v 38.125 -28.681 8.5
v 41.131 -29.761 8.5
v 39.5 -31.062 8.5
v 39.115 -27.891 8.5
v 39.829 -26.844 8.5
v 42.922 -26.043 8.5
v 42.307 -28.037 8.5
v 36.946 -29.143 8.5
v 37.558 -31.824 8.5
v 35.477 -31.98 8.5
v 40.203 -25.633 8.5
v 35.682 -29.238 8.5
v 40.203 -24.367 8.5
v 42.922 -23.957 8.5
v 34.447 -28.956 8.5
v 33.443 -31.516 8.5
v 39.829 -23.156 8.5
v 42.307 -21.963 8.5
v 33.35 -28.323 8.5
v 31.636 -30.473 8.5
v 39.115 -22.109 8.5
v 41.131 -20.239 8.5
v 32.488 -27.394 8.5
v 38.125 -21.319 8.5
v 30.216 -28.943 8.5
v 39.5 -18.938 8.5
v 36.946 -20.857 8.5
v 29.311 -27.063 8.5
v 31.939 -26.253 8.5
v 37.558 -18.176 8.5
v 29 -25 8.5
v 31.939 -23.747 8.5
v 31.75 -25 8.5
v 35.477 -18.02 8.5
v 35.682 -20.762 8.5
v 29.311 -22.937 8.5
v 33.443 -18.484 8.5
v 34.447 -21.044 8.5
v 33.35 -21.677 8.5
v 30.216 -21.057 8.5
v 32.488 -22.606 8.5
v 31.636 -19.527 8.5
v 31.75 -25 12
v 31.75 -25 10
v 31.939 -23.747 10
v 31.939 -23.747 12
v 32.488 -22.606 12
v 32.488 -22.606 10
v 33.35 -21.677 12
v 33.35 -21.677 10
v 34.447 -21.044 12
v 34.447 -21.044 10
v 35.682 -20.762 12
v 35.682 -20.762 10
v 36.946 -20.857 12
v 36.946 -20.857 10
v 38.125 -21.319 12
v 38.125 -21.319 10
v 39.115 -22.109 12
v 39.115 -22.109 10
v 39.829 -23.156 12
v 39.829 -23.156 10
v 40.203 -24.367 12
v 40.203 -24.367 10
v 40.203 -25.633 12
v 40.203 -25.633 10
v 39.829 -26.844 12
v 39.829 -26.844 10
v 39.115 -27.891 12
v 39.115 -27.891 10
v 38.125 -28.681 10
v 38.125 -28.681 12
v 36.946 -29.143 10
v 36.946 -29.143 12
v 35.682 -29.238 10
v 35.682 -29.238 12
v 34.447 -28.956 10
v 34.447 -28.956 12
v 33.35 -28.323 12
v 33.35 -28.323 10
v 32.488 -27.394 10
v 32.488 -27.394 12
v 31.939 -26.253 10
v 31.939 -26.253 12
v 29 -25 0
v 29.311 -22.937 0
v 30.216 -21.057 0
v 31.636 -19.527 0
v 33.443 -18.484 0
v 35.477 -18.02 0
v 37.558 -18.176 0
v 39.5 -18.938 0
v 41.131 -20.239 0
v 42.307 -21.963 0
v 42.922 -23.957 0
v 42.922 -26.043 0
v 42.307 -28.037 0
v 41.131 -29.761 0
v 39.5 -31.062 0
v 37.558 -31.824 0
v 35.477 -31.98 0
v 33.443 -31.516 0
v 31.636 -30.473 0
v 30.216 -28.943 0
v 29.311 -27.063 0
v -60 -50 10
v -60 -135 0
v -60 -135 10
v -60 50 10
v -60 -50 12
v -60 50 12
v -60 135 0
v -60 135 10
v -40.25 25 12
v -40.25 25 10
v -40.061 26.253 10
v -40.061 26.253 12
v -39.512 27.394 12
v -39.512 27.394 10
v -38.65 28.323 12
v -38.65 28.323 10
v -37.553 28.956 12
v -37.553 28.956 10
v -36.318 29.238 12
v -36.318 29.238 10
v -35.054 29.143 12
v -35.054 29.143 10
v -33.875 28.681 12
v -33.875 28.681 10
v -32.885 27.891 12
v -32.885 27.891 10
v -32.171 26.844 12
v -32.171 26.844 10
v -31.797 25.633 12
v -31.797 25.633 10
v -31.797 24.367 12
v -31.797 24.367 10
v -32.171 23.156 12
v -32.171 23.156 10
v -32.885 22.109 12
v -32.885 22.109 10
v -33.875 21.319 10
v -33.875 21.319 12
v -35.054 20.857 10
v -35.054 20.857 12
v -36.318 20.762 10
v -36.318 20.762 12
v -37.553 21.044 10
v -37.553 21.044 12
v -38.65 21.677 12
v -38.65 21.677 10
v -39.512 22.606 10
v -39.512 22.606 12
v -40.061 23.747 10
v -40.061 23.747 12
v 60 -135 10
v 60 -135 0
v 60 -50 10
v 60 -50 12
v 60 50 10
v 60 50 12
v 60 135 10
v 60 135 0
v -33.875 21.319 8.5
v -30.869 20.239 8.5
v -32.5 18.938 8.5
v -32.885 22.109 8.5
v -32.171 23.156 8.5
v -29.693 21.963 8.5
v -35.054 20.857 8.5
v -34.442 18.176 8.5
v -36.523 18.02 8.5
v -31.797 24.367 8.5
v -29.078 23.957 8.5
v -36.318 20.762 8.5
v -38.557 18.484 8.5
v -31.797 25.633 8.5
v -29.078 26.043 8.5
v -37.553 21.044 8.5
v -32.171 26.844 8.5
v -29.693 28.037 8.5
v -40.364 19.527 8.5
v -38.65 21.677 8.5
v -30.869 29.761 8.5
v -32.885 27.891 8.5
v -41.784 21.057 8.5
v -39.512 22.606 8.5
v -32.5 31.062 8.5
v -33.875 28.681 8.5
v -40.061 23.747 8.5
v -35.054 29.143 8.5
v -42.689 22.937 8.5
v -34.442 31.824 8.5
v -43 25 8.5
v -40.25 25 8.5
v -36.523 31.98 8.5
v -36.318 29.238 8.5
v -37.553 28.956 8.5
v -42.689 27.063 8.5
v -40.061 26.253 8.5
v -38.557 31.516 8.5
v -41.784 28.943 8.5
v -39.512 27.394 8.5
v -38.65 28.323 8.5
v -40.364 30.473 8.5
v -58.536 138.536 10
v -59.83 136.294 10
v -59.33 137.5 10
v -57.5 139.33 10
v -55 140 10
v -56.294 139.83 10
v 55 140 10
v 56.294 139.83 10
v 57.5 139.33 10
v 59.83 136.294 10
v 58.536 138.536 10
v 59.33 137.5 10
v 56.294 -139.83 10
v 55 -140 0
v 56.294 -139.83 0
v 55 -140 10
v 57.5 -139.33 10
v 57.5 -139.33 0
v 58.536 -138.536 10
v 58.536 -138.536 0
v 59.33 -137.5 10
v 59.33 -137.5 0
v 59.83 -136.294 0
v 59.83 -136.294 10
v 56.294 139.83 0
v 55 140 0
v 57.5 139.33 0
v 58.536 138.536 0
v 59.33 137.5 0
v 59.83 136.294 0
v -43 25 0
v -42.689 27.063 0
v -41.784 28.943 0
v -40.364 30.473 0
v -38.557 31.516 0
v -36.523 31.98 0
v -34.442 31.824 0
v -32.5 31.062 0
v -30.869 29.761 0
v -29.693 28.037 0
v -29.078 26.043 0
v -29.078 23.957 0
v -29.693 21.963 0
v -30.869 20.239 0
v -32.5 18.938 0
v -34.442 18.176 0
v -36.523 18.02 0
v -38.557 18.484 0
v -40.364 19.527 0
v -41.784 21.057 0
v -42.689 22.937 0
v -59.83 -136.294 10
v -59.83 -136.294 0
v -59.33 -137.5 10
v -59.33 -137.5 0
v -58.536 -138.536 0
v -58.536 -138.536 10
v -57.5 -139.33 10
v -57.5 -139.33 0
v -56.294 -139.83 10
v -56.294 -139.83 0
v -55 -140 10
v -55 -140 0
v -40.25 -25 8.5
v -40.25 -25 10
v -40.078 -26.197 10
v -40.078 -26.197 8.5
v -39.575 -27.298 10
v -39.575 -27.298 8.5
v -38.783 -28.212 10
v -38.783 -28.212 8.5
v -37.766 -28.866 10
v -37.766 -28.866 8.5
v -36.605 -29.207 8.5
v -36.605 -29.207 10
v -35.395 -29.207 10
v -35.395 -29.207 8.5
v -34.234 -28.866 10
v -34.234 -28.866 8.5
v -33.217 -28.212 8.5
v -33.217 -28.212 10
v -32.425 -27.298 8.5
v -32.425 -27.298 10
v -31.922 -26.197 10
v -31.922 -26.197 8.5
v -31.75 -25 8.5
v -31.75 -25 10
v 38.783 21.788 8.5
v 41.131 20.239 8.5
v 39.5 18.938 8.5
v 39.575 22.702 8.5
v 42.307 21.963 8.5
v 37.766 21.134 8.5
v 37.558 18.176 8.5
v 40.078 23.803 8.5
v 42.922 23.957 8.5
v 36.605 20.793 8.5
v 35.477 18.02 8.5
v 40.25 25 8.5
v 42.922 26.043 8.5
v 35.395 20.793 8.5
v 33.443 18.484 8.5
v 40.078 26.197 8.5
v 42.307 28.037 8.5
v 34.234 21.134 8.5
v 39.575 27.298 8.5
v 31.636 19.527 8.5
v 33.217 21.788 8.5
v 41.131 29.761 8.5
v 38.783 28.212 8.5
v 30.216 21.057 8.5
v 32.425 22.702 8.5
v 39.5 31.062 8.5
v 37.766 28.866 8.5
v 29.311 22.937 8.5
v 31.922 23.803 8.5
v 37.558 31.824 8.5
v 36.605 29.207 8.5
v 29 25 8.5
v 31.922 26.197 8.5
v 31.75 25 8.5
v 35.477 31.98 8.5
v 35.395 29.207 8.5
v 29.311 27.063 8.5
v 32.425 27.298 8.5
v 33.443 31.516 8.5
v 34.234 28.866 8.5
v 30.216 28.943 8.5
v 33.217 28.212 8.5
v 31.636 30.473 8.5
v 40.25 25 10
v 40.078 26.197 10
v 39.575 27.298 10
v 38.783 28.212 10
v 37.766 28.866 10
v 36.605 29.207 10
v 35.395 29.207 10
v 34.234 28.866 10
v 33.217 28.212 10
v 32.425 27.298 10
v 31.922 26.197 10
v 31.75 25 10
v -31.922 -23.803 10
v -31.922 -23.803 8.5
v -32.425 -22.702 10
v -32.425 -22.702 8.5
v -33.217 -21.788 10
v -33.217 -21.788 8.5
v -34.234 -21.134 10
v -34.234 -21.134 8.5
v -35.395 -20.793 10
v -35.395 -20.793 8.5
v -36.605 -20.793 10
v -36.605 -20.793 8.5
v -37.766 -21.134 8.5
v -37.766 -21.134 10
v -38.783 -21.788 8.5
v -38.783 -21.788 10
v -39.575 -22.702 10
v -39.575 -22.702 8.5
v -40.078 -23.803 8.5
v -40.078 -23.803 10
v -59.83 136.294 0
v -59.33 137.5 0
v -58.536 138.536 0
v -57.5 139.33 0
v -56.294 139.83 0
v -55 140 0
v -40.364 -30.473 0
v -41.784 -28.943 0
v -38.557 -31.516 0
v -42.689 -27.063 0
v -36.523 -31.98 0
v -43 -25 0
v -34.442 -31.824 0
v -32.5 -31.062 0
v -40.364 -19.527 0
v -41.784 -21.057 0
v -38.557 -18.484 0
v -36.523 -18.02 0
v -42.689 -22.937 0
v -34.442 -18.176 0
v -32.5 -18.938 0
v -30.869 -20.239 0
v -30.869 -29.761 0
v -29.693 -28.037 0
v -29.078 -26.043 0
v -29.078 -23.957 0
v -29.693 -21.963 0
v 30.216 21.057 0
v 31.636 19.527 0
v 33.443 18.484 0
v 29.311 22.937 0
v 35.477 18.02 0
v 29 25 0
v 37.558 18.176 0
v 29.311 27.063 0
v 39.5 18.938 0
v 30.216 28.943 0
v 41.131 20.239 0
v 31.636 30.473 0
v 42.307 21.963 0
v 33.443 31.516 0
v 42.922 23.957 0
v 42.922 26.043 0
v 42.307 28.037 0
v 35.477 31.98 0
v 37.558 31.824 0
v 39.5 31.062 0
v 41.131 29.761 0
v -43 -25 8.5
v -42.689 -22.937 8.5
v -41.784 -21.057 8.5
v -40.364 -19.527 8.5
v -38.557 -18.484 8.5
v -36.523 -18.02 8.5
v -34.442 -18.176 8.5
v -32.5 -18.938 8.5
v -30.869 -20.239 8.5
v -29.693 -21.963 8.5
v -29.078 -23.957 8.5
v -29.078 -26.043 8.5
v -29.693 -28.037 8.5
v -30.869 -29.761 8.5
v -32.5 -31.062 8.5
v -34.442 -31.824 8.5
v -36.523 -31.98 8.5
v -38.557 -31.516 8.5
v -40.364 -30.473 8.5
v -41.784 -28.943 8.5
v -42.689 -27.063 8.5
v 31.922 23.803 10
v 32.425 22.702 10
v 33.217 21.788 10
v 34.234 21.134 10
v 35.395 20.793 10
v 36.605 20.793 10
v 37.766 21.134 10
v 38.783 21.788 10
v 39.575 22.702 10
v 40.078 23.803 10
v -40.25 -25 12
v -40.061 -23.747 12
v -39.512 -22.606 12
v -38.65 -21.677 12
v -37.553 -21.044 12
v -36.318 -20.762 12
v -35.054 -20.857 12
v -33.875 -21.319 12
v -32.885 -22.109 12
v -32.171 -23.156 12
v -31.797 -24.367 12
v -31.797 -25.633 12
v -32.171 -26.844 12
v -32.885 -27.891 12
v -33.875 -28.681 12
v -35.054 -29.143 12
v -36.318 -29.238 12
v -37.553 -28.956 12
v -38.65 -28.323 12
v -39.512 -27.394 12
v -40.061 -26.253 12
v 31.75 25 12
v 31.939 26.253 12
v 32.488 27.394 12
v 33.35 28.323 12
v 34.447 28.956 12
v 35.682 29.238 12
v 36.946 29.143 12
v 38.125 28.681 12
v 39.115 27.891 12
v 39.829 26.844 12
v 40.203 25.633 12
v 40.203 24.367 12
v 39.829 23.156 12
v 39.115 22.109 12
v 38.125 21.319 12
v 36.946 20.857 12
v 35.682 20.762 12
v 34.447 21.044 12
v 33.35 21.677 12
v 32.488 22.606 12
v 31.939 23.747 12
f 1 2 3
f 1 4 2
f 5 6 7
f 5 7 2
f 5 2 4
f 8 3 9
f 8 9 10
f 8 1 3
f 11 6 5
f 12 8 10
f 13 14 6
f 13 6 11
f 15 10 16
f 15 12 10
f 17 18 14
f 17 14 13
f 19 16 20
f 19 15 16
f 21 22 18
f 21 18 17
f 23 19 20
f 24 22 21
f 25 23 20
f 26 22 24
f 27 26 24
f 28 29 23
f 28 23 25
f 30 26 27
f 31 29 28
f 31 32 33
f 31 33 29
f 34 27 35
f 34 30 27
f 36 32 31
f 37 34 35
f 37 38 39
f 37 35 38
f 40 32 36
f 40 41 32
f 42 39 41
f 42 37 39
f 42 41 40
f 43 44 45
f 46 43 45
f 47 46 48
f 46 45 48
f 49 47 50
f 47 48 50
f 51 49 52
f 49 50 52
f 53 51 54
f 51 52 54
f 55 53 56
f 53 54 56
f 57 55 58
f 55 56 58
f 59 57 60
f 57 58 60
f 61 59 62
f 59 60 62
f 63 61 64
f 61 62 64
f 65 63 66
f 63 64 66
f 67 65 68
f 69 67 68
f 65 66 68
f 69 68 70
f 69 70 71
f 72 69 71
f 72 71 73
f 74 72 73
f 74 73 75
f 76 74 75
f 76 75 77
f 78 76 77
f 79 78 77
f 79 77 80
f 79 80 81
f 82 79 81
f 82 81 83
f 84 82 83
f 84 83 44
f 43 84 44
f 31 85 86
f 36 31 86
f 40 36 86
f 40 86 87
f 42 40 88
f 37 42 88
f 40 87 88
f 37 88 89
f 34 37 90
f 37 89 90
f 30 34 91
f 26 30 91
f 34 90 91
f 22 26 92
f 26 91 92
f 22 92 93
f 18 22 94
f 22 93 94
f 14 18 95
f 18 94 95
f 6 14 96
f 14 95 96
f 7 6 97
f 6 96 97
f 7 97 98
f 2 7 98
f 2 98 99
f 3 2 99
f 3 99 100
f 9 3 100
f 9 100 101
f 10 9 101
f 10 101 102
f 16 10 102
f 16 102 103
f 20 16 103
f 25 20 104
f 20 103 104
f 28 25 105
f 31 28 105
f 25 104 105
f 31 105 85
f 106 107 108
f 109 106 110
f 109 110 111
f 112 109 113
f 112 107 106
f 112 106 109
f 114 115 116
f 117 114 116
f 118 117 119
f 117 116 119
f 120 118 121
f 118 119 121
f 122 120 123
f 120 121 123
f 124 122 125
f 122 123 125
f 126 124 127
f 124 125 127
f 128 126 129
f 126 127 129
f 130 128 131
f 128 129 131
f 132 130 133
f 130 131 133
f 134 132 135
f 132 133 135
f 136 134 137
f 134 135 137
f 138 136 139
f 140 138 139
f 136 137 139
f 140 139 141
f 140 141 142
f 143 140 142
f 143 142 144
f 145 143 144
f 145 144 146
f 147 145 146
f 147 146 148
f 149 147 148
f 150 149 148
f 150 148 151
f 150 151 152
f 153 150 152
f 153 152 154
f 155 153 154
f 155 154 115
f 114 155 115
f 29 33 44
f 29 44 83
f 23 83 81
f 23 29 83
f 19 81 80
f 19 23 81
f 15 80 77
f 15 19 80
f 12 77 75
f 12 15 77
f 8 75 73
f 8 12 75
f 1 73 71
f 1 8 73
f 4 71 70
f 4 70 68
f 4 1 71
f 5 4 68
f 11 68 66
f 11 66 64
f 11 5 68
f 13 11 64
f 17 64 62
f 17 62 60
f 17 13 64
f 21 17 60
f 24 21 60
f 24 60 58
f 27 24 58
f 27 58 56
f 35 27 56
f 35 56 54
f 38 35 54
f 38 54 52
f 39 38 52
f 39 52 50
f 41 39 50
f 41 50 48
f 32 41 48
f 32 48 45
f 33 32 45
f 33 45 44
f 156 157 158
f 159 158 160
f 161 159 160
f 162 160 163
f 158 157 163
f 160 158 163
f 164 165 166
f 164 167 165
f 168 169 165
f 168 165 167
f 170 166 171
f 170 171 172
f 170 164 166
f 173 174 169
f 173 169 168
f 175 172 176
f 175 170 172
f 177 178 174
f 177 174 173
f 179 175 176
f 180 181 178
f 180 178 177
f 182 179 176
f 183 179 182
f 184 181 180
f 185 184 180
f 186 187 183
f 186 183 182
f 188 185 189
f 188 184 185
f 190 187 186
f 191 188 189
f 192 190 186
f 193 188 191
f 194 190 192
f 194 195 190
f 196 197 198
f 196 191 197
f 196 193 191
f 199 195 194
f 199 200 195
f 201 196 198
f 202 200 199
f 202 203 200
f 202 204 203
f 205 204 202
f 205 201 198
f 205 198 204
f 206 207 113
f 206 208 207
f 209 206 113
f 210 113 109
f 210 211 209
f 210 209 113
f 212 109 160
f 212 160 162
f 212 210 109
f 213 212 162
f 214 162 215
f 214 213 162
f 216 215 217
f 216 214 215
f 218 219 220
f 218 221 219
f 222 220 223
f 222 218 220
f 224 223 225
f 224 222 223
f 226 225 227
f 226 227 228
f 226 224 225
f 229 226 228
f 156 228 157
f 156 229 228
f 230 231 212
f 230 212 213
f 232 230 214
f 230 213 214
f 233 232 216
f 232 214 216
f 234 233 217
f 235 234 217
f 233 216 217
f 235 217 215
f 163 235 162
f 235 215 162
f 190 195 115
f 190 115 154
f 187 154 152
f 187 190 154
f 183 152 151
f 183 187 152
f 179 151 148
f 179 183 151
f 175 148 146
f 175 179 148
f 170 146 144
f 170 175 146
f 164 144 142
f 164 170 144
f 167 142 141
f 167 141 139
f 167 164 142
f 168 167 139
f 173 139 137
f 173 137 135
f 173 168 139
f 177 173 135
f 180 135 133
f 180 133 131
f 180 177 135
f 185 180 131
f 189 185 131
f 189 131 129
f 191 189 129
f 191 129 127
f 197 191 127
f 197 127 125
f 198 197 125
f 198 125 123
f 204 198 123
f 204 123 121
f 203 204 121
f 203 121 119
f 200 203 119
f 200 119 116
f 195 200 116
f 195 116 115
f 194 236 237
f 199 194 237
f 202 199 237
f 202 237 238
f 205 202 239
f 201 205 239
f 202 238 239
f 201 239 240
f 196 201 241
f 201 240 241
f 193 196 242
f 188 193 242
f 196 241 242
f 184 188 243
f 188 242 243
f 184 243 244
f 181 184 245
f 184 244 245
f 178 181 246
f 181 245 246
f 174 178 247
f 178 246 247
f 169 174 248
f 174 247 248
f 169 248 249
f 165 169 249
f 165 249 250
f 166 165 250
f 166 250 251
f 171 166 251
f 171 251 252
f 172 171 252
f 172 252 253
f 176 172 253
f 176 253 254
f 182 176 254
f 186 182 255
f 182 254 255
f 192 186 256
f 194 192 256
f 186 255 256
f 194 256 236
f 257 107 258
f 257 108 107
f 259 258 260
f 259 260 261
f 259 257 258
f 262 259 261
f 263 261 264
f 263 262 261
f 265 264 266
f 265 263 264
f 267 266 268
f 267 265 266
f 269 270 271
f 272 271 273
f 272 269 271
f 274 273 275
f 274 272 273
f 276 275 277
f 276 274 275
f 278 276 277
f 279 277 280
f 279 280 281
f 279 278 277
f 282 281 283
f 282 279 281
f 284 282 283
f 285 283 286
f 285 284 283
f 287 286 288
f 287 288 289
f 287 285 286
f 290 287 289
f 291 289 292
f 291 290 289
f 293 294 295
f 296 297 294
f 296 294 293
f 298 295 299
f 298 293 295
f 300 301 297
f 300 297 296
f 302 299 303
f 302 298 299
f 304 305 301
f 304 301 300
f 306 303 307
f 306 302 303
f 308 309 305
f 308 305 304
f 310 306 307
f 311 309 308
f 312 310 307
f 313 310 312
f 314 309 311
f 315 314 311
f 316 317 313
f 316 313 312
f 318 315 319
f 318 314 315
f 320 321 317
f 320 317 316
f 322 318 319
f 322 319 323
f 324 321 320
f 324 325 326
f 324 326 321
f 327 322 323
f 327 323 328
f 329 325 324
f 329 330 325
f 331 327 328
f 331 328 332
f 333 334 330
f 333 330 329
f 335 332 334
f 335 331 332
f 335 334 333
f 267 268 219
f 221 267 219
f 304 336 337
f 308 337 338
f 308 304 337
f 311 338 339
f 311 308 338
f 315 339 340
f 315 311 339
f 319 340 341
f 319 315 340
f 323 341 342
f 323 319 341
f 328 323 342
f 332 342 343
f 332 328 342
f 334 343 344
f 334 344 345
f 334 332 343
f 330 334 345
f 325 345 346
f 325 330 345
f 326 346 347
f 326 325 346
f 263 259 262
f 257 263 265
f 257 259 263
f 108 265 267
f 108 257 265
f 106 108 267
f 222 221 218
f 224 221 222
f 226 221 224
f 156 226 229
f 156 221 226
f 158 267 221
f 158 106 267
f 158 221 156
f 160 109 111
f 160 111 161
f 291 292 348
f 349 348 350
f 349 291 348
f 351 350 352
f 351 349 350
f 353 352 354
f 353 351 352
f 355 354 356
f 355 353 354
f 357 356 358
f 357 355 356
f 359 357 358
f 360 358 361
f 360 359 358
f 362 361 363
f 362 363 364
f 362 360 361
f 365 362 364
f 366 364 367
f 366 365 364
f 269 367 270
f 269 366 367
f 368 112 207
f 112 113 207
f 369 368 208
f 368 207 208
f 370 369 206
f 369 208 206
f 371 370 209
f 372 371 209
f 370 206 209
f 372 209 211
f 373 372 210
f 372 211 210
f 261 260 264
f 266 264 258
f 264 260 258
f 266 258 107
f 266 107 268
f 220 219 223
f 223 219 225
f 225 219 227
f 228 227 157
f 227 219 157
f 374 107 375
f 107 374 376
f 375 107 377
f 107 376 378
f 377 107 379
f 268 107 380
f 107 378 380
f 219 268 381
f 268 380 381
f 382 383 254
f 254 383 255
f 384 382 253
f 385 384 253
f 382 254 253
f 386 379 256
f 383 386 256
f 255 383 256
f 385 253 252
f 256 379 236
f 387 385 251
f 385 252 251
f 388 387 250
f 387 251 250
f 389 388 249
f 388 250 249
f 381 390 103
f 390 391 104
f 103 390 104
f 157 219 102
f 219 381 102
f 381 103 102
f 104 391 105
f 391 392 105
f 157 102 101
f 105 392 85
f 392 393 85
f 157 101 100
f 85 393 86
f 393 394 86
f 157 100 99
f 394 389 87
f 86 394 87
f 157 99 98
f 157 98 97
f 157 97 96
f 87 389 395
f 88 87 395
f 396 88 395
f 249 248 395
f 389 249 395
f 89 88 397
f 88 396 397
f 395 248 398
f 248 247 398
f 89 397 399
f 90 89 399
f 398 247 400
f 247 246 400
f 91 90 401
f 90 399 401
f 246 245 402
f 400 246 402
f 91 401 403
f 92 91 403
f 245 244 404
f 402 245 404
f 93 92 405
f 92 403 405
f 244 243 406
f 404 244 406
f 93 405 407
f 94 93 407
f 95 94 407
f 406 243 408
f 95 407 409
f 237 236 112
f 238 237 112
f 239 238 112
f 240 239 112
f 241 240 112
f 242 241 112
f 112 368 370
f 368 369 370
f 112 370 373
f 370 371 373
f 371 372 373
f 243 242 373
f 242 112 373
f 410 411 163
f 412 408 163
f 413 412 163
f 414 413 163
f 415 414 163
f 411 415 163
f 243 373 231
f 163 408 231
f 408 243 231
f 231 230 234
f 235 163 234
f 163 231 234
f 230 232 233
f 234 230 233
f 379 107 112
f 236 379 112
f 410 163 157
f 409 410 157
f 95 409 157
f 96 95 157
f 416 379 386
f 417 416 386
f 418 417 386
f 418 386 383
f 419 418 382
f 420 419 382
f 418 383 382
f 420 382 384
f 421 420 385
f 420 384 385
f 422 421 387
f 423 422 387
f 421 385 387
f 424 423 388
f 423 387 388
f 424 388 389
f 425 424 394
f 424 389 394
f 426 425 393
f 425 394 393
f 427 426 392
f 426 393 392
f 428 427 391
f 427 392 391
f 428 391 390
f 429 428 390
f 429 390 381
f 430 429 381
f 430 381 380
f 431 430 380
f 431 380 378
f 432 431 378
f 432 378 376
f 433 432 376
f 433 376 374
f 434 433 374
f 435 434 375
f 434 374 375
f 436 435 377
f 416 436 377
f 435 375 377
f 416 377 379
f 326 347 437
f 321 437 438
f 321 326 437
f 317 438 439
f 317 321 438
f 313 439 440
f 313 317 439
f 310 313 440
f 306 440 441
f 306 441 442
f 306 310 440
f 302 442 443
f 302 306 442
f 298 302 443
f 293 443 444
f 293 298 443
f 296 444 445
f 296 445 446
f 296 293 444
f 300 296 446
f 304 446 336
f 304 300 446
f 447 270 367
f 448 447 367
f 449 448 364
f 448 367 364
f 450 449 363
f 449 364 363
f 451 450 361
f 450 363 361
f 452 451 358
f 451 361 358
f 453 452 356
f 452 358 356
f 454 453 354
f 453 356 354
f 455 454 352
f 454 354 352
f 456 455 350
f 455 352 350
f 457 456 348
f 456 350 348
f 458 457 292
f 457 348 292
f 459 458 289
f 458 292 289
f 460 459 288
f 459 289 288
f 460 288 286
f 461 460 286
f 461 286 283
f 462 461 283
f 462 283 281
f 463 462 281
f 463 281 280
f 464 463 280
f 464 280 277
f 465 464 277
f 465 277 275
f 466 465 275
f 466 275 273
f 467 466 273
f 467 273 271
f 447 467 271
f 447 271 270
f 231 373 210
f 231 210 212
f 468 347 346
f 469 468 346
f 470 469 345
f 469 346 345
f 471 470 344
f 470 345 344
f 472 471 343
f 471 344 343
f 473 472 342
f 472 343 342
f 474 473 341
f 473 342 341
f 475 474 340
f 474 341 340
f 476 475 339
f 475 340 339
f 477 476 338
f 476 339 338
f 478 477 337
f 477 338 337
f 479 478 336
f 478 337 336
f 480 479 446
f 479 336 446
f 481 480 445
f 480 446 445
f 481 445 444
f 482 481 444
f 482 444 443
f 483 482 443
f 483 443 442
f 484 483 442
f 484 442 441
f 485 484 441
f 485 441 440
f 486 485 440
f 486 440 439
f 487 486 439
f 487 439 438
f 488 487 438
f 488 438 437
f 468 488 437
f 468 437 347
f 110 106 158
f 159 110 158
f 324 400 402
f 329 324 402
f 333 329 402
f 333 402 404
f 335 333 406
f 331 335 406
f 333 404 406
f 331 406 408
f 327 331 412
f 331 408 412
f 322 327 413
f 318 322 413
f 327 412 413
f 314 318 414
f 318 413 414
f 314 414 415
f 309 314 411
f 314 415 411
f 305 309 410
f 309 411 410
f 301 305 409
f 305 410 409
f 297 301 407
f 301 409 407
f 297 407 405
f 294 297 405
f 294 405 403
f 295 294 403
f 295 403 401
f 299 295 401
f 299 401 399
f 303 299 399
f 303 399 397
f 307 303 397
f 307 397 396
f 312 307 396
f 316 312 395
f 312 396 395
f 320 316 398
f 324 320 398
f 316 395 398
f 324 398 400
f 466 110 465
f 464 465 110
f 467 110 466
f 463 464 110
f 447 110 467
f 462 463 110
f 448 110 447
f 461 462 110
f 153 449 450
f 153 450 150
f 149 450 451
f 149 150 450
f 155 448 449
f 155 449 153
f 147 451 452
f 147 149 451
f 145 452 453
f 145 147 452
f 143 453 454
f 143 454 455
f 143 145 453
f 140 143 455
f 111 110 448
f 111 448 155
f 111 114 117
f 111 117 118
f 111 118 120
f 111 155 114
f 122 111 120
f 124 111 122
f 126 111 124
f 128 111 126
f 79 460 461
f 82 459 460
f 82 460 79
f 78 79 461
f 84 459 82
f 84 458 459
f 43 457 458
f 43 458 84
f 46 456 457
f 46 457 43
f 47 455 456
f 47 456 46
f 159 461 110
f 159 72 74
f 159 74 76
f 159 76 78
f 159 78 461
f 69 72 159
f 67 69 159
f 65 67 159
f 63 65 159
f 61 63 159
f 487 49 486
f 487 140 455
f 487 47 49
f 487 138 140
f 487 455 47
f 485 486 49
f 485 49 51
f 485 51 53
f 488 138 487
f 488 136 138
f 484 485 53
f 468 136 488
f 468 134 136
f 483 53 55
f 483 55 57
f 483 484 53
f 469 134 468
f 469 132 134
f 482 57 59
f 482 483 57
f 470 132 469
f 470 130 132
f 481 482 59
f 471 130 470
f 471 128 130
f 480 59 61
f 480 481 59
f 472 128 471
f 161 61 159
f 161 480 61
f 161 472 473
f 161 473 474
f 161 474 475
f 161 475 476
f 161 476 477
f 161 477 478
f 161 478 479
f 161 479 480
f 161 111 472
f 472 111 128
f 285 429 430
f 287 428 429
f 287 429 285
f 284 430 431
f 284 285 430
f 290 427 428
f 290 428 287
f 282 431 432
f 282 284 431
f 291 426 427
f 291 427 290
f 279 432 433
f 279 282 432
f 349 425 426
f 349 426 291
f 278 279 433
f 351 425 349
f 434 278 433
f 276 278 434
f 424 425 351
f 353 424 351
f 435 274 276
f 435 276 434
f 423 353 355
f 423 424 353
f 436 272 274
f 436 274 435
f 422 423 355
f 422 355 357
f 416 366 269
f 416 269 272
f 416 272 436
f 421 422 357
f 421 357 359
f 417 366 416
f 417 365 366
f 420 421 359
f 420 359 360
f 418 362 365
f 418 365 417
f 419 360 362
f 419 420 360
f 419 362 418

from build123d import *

# Parameters (mm, degrees)
SKETCH_1_W          = 120
SKETCH_1_H          = 280
SKETCH_1_R          = 4.25
EXTRUDE_1_DEPTH     = 10
FILLET_1_R          = 5
SKETCH_2_W          = 120
SKETCH_2_H          = 100
EXTRUDE_2_DEPTH     = 2
SKETCH_3_R          = 4.25
CUT_EXTRUDE_1_DEPTH = 35
SKETCH_5_R          = 7
CUT_EXTRUDE_3_DEPTH = 8.5


with BuildPart() as part:
    # 草图1 → 凸台-拉伸1 (new body)
    with BuildSketch(Plane.XY):
        Rectangle(SKETCH_1_W, SKETCH_1_H)
        with Locations((36, 25)):
            Circle(SKETCH_1_R, mode=Mode.SUBTRACT)
        with Locations(Location((36, -25, 0), (0, 0, 180))):
            Circle(SKETCH_1_R, mode=Mode.SUBTRACT)
        with Locations((-36, -25)):
            Circle(SKETCH_1_R, mode=Mode.SUBTRACT)
        with Locations(Location((-36, 25, 0), (0, 0, 180))):
            Circle(SKETCH_1_R, mode=Mode.SUBTRACT)
    extrude(amount=EXTRUDE_1_DEPTH)

    # 圆角1
    fillet_1_edges = [part.edges().sort_by_distance(p)[0] for p in [
        (-60, 140, 5),
        (60, 140, 5),
        (60, -140, 5),
        (-60, -140, 5),
    ]]
    fillet(fillet_1_edges, radius=FILLET_1_R)

    # 草图2 → 凸台-拉伸2 (add)
    with BuildSketch(Plane.XY.offset(10)):
        Rectangle(SKETCH_2_W, SKETCH_2_H)
    extrude(amount=EXTRUDE_2_DEPTH)

    # 草图3 → 切除-拉伸1 (cut)
    with BuildSketch(Plane(origin=(0, 0, 0), x_dir=(-1, 0, 0), z_dir=(0, 0, -1))):
        with Locations((-36, -25)):
            Circle(SKETCH_3_R)
        with Locations((-36, 25)):
            Circle(SKETCH_3_R)
        with Locations((36, 25)):
            Circle(SKETCH_3_R)
        with Locations((36, -25)):
            Circle(SKETCH_3_R)
    extrude(amount=-CUT_EXTRUDE_1_DEPTH, mode=Mode.SUBTRACT)

    # 草图5 → 切除-拉伸3 (cut)
    with BuildSketch(Plane(origin=(0, 0, 0), x_dir=(-1, 0, 0), z_dir=(0, 0, -1))):
        with Locations((36, 25)):
            Circle(SKETCH_5_R)
        with Locations((36, -25)):
            Circle(SKETCH_5_R)
        with Locations((-36, -25)):
            Circle(SKETCH_5_R)
        with Locations((-36, 25)):
            Circle(SKETCH_5_R)
    extrude(amount=-CUT_EXTRUDE_3_DEPTH, mode=Mode.SUBTRACT)


solid = part.part
